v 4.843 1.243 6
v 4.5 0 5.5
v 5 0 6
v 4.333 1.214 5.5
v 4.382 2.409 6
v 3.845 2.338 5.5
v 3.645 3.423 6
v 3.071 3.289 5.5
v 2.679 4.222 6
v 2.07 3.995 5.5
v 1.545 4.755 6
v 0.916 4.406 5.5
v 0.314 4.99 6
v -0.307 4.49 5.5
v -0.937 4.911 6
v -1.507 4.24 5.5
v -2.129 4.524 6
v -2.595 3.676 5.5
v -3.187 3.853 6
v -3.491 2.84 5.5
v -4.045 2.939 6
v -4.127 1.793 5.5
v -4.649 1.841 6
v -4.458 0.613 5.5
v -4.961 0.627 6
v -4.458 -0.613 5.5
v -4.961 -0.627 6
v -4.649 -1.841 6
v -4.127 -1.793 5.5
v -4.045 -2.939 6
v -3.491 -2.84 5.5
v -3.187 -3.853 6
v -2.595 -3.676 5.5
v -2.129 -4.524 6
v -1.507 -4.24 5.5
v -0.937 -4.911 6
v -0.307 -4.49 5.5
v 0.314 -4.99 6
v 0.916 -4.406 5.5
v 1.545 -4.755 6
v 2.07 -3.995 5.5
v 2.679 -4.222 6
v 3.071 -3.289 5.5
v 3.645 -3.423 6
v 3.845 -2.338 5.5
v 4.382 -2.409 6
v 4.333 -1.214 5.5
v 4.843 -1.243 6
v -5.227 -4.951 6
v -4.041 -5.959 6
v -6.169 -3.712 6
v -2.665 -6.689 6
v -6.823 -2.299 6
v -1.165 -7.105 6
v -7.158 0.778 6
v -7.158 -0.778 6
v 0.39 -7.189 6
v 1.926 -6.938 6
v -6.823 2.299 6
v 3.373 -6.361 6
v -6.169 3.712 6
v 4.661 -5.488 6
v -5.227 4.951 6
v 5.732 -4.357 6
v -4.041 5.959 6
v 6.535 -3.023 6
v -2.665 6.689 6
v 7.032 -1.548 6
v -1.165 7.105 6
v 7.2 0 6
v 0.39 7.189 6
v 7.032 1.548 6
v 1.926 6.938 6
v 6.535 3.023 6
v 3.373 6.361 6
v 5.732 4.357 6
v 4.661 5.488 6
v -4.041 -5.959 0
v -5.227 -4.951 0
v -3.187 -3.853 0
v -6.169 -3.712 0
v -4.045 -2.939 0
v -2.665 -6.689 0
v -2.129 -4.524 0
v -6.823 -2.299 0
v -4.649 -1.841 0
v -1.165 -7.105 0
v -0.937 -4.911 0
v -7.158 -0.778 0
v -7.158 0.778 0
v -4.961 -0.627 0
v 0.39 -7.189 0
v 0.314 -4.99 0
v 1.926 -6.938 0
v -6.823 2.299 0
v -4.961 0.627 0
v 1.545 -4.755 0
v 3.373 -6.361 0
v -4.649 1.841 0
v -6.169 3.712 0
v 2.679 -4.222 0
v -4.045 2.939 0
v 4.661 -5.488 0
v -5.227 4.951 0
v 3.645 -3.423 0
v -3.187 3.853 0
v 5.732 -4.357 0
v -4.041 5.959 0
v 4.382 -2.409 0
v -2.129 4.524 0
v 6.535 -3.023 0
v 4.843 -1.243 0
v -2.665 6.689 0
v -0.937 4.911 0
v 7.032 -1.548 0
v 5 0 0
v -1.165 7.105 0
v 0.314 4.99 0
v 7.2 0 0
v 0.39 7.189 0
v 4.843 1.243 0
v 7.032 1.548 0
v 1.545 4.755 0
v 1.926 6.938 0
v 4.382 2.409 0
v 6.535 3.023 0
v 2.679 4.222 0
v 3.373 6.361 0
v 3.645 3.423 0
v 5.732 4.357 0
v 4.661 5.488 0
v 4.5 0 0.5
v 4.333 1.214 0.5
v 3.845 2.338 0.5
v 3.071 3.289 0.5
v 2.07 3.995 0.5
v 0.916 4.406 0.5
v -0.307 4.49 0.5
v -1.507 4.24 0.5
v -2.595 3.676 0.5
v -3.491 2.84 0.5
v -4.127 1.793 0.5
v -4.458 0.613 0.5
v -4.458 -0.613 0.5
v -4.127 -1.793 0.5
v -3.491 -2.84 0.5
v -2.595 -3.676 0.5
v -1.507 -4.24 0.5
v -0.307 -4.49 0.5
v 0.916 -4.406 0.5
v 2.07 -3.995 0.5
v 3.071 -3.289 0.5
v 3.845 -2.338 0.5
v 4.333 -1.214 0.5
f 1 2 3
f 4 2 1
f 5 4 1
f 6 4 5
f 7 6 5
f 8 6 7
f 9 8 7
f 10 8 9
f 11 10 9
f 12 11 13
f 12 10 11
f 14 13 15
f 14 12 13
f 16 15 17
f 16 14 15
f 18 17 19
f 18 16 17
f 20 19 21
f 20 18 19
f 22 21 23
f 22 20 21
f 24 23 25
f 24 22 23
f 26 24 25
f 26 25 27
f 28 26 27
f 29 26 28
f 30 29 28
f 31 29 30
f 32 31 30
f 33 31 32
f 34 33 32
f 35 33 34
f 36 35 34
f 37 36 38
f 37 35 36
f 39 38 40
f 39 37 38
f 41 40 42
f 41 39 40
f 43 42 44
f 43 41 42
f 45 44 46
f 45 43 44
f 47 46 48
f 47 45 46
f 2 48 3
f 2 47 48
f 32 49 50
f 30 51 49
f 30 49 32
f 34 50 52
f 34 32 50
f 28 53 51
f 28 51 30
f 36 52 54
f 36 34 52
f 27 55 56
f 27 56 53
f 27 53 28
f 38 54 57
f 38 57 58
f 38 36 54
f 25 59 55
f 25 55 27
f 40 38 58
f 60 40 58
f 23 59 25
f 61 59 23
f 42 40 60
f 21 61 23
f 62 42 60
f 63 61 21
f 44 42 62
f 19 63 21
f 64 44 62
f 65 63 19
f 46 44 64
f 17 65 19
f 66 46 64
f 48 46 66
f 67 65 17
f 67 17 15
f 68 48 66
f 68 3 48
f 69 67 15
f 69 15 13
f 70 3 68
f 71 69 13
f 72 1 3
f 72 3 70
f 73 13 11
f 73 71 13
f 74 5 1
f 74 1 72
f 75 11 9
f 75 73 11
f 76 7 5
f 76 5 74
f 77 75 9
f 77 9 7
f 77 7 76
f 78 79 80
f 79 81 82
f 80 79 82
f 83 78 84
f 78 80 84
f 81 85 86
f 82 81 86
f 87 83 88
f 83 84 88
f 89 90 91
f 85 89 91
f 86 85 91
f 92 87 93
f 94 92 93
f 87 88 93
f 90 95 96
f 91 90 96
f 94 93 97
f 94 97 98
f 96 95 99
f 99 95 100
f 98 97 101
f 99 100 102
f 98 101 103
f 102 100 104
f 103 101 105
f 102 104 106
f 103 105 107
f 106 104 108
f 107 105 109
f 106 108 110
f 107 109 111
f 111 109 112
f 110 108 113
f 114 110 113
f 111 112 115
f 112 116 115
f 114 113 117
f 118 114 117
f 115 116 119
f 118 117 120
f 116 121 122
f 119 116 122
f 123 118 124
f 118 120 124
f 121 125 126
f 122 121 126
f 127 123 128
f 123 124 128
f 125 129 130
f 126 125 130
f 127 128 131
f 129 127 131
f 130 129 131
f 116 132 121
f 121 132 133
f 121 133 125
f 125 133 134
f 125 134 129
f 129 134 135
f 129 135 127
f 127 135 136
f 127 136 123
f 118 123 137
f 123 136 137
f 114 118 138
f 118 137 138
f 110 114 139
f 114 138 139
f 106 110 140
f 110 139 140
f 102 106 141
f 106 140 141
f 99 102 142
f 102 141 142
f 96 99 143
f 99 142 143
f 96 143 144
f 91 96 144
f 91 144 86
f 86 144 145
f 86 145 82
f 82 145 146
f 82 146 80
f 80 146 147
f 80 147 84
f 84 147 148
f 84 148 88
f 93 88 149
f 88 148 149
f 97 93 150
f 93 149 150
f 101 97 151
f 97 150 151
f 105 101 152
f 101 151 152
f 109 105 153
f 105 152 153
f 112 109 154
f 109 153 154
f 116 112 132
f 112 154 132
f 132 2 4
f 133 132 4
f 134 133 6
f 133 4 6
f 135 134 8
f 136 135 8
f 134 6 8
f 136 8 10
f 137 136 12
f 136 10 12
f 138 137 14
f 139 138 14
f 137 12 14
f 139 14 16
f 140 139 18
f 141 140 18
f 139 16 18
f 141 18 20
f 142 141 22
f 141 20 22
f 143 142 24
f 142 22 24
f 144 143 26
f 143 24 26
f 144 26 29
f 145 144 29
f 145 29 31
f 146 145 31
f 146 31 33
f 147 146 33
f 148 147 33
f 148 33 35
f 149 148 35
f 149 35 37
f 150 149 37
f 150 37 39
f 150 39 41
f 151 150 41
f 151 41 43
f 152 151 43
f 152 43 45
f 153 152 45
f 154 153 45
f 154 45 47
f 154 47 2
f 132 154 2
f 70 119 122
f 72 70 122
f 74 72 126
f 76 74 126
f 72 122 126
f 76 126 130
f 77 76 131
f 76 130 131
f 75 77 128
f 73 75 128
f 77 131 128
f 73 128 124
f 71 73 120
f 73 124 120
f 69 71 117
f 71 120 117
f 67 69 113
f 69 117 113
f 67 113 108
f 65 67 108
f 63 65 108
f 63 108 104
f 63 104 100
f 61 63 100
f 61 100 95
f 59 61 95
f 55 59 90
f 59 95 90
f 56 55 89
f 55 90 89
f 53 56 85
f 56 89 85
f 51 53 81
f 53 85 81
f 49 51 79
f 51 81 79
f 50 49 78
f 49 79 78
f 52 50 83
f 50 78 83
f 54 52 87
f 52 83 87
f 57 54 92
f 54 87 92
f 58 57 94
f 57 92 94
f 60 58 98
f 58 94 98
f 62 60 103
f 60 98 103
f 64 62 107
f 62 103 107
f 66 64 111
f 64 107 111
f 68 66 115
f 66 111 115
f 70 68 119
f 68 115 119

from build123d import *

# Parameters (mm, degrees)
F0_R     = 7.2
F1_DEPTH = 6
F2_R     = 4.5
F3_DEPTH = 25
F4_SIZE2 = 0.5
F4_SIZE  = 0.5


with BuildPart() as f1:
    # F0 (on Top) → F1 (new body)
    with BuildSketch(Plane.XY):
        Circle(F0_R)
    extrude(amount=F1_DEPTH)

    # F2 (on face) → F3 (cut)
    with BuildSketch(Plane.XY.offset(6)):
        Circle(F2_R)
    extrude(amount=-F3_DEPTH, mode=Mode.SUBTRACT)

    # F4
    f4_edges = [f1.edges().sort_by_distance(p)[0] for p in [
        (-4.5, 0, 6),
        (-4.5, 0, 0),
    ]]
    chamfer(f4_edges, length=F4_SIZE, length2=F4_SIZE2)


solid = f1.part
